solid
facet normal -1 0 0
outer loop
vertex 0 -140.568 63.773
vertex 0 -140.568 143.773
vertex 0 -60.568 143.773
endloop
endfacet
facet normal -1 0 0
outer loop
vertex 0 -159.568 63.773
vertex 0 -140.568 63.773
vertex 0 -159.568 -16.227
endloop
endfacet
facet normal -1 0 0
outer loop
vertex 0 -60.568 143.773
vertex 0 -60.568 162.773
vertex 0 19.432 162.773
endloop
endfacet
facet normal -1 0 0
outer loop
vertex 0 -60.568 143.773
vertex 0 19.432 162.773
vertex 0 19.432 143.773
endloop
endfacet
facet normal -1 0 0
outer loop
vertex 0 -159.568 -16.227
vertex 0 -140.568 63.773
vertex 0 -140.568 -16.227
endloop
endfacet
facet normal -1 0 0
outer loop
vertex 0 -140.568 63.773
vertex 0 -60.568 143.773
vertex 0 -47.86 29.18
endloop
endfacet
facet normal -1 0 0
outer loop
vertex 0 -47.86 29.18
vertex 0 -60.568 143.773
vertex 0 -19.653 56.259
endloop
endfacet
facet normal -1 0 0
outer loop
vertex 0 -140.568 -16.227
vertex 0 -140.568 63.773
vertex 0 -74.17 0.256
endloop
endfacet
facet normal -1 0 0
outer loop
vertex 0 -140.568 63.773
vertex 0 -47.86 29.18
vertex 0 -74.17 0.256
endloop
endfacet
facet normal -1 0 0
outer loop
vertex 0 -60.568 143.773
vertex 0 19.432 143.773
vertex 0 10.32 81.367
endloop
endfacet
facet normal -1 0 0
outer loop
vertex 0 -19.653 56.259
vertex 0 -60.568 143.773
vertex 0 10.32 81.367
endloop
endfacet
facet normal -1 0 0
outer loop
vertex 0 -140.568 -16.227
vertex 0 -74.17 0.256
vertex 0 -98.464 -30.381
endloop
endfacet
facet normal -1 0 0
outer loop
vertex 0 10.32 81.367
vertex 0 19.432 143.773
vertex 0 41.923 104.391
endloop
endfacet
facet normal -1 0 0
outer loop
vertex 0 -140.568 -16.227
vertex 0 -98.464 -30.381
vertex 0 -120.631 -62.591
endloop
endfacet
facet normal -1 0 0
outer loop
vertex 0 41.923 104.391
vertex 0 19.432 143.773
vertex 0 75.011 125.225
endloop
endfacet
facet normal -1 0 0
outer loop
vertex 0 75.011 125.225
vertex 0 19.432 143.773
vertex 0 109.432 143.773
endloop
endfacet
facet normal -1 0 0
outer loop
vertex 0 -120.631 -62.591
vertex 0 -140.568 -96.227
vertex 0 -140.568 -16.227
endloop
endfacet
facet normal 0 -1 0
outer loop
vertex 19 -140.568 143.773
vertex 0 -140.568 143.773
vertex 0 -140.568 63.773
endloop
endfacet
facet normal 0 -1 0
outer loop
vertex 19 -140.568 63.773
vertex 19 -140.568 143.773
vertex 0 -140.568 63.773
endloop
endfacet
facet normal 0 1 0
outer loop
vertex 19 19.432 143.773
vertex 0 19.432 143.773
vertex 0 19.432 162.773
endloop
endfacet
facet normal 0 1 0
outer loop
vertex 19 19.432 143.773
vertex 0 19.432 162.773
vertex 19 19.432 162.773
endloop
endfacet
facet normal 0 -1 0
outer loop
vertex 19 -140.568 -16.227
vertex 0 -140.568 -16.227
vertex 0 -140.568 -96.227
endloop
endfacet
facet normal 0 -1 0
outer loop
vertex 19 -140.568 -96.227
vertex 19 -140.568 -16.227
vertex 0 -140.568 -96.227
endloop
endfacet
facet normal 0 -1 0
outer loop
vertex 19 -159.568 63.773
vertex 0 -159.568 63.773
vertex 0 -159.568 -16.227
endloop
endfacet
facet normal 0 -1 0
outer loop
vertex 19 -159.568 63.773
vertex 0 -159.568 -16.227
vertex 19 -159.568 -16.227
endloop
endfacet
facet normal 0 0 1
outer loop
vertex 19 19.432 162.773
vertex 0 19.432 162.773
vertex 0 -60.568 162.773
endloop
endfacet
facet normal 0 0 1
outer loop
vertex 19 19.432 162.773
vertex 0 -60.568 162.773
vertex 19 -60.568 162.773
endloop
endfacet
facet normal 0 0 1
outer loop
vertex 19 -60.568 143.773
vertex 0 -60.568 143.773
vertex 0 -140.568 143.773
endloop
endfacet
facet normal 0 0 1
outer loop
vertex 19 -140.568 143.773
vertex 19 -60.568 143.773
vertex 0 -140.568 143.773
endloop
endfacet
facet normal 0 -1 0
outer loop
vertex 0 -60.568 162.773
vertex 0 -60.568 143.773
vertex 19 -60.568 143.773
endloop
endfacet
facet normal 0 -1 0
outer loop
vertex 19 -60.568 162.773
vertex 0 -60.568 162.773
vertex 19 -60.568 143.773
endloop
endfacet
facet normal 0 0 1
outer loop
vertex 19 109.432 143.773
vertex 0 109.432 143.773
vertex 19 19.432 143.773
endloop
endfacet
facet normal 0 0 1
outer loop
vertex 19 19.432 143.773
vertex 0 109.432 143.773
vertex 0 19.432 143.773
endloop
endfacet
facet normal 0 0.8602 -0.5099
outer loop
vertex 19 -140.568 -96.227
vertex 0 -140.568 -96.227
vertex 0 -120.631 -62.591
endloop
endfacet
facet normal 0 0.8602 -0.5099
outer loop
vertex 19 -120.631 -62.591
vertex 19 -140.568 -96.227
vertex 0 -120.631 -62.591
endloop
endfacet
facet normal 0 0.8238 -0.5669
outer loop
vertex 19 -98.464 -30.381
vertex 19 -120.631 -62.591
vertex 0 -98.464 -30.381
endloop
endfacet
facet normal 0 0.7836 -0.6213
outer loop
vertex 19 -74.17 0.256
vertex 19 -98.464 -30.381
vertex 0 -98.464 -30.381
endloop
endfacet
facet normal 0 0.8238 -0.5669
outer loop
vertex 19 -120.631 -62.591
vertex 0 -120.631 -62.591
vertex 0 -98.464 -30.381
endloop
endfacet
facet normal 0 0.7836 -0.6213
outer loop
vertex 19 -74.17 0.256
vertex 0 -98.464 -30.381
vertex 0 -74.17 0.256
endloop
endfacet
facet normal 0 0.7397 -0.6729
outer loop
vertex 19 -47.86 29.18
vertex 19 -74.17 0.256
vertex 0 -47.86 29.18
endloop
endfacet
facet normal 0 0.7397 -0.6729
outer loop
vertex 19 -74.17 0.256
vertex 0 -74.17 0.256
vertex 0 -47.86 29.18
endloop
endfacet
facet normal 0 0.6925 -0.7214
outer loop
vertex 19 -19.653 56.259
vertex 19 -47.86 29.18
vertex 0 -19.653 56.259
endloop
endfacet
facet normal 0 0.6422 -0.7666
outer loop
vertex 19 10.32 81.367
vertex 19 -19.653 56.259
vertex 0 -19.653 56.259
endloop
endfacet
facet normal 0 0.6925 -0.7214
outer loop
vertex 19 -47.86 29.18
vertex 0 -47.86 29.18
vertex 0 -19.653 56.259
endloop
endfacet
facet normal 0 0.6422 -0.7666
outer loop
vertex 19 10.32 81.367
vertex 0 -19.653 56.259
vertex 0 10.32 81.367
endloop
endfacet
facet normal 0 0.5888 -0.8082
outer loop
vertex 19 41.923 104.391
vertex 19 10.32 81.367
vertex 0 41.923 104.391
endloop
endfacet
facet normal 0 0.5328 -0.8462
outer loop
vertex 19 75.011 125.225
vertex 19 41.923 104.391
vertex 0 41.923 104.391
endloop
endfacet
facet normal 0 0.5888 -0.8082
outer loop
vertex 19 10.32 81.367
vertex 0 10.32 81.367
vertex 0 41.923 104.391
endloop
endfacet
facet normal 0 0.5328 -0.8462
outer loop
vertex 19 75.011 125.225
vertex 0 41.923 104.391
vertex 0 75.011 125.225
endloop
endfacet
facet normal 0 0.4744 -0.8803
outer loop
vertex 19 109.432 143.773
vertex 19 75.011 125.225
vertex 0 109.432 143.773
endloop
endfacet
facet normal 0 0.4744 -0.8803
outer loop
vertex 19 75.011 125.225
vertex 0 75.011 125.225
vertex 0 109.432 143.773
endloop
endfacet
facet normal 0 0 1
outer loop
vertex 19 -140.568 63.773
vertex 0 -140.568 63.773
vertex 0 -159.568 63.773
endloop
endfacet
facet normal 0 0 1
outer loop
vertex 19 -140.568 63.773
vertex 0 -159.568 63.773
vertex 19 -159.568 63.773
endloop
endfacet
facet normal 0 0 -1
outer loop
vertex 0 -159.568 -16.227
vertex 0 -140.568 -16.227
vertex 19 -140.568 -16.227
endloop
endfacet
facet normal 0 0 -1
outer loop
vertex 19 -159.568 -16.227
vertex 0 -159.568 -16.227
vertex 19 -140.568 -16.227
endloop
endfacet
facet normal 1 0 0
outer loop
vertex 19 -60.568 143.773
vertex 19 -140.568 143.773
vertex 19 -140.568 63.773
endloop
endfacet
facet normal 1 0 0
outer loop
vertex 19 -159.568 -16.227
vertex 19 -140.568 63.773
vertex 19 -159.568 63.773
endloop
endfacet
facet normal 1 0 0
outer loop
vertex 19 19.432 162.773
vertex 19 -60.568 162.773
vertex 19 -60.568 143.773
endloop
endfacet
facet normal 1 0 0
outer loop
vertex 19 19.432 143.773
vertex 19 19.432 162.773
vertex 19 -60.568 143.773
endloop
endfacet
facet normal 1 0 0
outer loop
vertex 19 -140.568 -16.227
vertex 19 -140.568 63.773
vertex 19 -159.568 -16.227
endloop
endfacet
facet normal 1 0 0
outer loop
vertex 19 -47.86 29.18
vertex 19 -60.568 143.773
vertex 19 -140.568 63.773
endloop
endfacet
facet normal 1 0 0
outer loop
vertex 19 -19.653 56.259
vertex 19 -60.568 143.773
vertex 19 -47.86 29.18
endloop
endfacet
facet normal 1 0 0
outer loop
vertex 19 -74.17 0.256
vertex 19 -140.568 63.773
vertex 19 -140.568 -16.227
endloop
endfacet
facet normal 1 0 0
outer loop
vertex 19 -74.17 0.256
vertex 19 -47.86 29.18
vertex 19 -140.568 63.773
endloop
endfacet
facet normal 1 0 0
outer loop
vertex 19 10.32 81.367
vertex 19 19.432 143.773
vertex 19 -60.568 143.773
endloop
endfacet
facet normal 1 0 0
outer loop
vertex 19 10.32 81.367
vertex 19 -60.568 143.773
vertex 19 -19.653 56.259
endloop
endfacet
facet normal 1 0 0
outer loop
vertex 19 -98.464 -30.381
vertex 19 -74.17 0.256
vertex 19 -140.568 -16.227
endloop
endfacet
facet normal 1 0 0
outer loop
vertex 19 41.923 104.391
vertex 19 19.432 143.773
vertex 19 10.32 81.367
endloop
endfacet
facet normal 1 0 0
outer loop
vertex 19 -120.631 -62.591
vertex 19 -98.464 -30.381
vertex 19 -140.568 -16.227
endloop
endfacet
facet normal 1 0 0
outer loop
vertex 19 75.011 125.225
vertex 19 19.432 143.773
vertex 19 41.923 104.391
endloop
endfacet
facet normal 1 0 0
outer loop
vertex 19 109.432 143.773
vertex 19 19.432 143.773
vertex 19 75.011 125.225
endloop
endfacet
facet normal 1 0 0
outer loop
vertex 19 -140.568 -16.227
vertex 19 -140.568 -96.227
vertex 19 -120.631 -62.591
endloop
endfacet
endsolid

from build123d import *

# Parameters (mm, degrees)
BOSS_EXTRUDE1_DEPTH = 19
SKETCH2_W           = 19
SKETCH2_H           = 80
BOSS_EXTRUDE2_DEPTH = 19
SKETCH3_W           = 19
SKETCH3_H           = 80
BOSS_EXTRUDE3_DEPTH = 19


with BuildPart() as part:
    # Sketch1 → Boss-Extrude1 (new body)
    with BuildSketch(Plane(origin=(0, 0, 0), x_dir=(0, 0, -1), z_dir=(1, 0, 0))):
        with BuildLine():
            Line((-143.772893773, 109.432234432), (-143.772893773, -140.567765568))
            Line((-143.772893773, -140.567765568), (96.227106227, -140.567765568))
            ThreePointArc((96.227106227, -140.567765568), (-42.958076814, -33.985541287), (-143.772893773, 109.432234432))
        make_face()
    extrude(amount=BOSS_EXTRUDE1_DEPTH)

    # Sketch2 → Boss-Extrude2 (add)
    with BuildSketch(Plane.XZ.offset(140.567765568)):
        with Locations((9.5, 23.772893773)):
            Rectangle(SKETCH2_W, SKETCH2_H)
    extrude(amount=BOSS_EXTRUDE2_DEPTH)

    # Sketch3 → Boss-Extrude3 (add)
    with BuildSketch(Plane.XY.offset(143.772893773)):
        with Locations((9.5, -20.567765568)):
            Rectangle(SKETCH3_W, SKETCH3_H)
    extrude(amount=BOSS_EXTRUDE3_DEPTH)


solid = part.part
